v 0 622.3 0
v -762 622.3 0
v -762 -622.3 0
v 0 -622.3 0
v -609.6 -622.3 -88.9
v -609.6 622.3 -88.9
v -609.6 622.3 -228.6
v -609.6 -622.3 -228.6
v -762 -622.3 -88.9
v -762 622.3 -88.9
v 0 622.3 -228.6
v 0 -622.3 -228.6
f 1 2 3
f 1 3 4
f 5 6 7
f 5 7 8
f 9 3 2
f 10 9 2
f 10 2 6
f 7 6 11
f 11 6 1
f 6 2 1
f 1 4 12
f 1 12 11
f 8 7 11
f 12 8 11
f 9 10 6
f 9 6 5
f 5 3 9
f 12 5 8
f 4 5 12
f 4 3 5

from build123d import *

# Parameters (mm, degrees)
F0_W     = 762
F0_H     = 1244.6
F1_DEPTH = 228.6
F2_W     = 1244.6
F2_H     = 139.7
F3_DEPTH = 152.4


with BuildPart() as f1:
    # F0 (on Top) → F1 (new body)
    with BuildSketch(Plane.XY):
        with Locations((-381, 0)):
            Rectangle(F0_W, F0_H)
    extrude(amount=-F1_DEPTH)

    # F2 (on face) → F3 (cut)
    with BuildSketch(Plane(origin=(-762, 0, 0), x_dir=(0, -1, 0), z_dir=(-1, 0, 0))):
        with Locations((0, -158.75)):
            Rectangle(F2_W, F2_H)
    extrude(amount=-F3_DEPTH, mode=Mode.SUBTRACT)


solid = f1.part
